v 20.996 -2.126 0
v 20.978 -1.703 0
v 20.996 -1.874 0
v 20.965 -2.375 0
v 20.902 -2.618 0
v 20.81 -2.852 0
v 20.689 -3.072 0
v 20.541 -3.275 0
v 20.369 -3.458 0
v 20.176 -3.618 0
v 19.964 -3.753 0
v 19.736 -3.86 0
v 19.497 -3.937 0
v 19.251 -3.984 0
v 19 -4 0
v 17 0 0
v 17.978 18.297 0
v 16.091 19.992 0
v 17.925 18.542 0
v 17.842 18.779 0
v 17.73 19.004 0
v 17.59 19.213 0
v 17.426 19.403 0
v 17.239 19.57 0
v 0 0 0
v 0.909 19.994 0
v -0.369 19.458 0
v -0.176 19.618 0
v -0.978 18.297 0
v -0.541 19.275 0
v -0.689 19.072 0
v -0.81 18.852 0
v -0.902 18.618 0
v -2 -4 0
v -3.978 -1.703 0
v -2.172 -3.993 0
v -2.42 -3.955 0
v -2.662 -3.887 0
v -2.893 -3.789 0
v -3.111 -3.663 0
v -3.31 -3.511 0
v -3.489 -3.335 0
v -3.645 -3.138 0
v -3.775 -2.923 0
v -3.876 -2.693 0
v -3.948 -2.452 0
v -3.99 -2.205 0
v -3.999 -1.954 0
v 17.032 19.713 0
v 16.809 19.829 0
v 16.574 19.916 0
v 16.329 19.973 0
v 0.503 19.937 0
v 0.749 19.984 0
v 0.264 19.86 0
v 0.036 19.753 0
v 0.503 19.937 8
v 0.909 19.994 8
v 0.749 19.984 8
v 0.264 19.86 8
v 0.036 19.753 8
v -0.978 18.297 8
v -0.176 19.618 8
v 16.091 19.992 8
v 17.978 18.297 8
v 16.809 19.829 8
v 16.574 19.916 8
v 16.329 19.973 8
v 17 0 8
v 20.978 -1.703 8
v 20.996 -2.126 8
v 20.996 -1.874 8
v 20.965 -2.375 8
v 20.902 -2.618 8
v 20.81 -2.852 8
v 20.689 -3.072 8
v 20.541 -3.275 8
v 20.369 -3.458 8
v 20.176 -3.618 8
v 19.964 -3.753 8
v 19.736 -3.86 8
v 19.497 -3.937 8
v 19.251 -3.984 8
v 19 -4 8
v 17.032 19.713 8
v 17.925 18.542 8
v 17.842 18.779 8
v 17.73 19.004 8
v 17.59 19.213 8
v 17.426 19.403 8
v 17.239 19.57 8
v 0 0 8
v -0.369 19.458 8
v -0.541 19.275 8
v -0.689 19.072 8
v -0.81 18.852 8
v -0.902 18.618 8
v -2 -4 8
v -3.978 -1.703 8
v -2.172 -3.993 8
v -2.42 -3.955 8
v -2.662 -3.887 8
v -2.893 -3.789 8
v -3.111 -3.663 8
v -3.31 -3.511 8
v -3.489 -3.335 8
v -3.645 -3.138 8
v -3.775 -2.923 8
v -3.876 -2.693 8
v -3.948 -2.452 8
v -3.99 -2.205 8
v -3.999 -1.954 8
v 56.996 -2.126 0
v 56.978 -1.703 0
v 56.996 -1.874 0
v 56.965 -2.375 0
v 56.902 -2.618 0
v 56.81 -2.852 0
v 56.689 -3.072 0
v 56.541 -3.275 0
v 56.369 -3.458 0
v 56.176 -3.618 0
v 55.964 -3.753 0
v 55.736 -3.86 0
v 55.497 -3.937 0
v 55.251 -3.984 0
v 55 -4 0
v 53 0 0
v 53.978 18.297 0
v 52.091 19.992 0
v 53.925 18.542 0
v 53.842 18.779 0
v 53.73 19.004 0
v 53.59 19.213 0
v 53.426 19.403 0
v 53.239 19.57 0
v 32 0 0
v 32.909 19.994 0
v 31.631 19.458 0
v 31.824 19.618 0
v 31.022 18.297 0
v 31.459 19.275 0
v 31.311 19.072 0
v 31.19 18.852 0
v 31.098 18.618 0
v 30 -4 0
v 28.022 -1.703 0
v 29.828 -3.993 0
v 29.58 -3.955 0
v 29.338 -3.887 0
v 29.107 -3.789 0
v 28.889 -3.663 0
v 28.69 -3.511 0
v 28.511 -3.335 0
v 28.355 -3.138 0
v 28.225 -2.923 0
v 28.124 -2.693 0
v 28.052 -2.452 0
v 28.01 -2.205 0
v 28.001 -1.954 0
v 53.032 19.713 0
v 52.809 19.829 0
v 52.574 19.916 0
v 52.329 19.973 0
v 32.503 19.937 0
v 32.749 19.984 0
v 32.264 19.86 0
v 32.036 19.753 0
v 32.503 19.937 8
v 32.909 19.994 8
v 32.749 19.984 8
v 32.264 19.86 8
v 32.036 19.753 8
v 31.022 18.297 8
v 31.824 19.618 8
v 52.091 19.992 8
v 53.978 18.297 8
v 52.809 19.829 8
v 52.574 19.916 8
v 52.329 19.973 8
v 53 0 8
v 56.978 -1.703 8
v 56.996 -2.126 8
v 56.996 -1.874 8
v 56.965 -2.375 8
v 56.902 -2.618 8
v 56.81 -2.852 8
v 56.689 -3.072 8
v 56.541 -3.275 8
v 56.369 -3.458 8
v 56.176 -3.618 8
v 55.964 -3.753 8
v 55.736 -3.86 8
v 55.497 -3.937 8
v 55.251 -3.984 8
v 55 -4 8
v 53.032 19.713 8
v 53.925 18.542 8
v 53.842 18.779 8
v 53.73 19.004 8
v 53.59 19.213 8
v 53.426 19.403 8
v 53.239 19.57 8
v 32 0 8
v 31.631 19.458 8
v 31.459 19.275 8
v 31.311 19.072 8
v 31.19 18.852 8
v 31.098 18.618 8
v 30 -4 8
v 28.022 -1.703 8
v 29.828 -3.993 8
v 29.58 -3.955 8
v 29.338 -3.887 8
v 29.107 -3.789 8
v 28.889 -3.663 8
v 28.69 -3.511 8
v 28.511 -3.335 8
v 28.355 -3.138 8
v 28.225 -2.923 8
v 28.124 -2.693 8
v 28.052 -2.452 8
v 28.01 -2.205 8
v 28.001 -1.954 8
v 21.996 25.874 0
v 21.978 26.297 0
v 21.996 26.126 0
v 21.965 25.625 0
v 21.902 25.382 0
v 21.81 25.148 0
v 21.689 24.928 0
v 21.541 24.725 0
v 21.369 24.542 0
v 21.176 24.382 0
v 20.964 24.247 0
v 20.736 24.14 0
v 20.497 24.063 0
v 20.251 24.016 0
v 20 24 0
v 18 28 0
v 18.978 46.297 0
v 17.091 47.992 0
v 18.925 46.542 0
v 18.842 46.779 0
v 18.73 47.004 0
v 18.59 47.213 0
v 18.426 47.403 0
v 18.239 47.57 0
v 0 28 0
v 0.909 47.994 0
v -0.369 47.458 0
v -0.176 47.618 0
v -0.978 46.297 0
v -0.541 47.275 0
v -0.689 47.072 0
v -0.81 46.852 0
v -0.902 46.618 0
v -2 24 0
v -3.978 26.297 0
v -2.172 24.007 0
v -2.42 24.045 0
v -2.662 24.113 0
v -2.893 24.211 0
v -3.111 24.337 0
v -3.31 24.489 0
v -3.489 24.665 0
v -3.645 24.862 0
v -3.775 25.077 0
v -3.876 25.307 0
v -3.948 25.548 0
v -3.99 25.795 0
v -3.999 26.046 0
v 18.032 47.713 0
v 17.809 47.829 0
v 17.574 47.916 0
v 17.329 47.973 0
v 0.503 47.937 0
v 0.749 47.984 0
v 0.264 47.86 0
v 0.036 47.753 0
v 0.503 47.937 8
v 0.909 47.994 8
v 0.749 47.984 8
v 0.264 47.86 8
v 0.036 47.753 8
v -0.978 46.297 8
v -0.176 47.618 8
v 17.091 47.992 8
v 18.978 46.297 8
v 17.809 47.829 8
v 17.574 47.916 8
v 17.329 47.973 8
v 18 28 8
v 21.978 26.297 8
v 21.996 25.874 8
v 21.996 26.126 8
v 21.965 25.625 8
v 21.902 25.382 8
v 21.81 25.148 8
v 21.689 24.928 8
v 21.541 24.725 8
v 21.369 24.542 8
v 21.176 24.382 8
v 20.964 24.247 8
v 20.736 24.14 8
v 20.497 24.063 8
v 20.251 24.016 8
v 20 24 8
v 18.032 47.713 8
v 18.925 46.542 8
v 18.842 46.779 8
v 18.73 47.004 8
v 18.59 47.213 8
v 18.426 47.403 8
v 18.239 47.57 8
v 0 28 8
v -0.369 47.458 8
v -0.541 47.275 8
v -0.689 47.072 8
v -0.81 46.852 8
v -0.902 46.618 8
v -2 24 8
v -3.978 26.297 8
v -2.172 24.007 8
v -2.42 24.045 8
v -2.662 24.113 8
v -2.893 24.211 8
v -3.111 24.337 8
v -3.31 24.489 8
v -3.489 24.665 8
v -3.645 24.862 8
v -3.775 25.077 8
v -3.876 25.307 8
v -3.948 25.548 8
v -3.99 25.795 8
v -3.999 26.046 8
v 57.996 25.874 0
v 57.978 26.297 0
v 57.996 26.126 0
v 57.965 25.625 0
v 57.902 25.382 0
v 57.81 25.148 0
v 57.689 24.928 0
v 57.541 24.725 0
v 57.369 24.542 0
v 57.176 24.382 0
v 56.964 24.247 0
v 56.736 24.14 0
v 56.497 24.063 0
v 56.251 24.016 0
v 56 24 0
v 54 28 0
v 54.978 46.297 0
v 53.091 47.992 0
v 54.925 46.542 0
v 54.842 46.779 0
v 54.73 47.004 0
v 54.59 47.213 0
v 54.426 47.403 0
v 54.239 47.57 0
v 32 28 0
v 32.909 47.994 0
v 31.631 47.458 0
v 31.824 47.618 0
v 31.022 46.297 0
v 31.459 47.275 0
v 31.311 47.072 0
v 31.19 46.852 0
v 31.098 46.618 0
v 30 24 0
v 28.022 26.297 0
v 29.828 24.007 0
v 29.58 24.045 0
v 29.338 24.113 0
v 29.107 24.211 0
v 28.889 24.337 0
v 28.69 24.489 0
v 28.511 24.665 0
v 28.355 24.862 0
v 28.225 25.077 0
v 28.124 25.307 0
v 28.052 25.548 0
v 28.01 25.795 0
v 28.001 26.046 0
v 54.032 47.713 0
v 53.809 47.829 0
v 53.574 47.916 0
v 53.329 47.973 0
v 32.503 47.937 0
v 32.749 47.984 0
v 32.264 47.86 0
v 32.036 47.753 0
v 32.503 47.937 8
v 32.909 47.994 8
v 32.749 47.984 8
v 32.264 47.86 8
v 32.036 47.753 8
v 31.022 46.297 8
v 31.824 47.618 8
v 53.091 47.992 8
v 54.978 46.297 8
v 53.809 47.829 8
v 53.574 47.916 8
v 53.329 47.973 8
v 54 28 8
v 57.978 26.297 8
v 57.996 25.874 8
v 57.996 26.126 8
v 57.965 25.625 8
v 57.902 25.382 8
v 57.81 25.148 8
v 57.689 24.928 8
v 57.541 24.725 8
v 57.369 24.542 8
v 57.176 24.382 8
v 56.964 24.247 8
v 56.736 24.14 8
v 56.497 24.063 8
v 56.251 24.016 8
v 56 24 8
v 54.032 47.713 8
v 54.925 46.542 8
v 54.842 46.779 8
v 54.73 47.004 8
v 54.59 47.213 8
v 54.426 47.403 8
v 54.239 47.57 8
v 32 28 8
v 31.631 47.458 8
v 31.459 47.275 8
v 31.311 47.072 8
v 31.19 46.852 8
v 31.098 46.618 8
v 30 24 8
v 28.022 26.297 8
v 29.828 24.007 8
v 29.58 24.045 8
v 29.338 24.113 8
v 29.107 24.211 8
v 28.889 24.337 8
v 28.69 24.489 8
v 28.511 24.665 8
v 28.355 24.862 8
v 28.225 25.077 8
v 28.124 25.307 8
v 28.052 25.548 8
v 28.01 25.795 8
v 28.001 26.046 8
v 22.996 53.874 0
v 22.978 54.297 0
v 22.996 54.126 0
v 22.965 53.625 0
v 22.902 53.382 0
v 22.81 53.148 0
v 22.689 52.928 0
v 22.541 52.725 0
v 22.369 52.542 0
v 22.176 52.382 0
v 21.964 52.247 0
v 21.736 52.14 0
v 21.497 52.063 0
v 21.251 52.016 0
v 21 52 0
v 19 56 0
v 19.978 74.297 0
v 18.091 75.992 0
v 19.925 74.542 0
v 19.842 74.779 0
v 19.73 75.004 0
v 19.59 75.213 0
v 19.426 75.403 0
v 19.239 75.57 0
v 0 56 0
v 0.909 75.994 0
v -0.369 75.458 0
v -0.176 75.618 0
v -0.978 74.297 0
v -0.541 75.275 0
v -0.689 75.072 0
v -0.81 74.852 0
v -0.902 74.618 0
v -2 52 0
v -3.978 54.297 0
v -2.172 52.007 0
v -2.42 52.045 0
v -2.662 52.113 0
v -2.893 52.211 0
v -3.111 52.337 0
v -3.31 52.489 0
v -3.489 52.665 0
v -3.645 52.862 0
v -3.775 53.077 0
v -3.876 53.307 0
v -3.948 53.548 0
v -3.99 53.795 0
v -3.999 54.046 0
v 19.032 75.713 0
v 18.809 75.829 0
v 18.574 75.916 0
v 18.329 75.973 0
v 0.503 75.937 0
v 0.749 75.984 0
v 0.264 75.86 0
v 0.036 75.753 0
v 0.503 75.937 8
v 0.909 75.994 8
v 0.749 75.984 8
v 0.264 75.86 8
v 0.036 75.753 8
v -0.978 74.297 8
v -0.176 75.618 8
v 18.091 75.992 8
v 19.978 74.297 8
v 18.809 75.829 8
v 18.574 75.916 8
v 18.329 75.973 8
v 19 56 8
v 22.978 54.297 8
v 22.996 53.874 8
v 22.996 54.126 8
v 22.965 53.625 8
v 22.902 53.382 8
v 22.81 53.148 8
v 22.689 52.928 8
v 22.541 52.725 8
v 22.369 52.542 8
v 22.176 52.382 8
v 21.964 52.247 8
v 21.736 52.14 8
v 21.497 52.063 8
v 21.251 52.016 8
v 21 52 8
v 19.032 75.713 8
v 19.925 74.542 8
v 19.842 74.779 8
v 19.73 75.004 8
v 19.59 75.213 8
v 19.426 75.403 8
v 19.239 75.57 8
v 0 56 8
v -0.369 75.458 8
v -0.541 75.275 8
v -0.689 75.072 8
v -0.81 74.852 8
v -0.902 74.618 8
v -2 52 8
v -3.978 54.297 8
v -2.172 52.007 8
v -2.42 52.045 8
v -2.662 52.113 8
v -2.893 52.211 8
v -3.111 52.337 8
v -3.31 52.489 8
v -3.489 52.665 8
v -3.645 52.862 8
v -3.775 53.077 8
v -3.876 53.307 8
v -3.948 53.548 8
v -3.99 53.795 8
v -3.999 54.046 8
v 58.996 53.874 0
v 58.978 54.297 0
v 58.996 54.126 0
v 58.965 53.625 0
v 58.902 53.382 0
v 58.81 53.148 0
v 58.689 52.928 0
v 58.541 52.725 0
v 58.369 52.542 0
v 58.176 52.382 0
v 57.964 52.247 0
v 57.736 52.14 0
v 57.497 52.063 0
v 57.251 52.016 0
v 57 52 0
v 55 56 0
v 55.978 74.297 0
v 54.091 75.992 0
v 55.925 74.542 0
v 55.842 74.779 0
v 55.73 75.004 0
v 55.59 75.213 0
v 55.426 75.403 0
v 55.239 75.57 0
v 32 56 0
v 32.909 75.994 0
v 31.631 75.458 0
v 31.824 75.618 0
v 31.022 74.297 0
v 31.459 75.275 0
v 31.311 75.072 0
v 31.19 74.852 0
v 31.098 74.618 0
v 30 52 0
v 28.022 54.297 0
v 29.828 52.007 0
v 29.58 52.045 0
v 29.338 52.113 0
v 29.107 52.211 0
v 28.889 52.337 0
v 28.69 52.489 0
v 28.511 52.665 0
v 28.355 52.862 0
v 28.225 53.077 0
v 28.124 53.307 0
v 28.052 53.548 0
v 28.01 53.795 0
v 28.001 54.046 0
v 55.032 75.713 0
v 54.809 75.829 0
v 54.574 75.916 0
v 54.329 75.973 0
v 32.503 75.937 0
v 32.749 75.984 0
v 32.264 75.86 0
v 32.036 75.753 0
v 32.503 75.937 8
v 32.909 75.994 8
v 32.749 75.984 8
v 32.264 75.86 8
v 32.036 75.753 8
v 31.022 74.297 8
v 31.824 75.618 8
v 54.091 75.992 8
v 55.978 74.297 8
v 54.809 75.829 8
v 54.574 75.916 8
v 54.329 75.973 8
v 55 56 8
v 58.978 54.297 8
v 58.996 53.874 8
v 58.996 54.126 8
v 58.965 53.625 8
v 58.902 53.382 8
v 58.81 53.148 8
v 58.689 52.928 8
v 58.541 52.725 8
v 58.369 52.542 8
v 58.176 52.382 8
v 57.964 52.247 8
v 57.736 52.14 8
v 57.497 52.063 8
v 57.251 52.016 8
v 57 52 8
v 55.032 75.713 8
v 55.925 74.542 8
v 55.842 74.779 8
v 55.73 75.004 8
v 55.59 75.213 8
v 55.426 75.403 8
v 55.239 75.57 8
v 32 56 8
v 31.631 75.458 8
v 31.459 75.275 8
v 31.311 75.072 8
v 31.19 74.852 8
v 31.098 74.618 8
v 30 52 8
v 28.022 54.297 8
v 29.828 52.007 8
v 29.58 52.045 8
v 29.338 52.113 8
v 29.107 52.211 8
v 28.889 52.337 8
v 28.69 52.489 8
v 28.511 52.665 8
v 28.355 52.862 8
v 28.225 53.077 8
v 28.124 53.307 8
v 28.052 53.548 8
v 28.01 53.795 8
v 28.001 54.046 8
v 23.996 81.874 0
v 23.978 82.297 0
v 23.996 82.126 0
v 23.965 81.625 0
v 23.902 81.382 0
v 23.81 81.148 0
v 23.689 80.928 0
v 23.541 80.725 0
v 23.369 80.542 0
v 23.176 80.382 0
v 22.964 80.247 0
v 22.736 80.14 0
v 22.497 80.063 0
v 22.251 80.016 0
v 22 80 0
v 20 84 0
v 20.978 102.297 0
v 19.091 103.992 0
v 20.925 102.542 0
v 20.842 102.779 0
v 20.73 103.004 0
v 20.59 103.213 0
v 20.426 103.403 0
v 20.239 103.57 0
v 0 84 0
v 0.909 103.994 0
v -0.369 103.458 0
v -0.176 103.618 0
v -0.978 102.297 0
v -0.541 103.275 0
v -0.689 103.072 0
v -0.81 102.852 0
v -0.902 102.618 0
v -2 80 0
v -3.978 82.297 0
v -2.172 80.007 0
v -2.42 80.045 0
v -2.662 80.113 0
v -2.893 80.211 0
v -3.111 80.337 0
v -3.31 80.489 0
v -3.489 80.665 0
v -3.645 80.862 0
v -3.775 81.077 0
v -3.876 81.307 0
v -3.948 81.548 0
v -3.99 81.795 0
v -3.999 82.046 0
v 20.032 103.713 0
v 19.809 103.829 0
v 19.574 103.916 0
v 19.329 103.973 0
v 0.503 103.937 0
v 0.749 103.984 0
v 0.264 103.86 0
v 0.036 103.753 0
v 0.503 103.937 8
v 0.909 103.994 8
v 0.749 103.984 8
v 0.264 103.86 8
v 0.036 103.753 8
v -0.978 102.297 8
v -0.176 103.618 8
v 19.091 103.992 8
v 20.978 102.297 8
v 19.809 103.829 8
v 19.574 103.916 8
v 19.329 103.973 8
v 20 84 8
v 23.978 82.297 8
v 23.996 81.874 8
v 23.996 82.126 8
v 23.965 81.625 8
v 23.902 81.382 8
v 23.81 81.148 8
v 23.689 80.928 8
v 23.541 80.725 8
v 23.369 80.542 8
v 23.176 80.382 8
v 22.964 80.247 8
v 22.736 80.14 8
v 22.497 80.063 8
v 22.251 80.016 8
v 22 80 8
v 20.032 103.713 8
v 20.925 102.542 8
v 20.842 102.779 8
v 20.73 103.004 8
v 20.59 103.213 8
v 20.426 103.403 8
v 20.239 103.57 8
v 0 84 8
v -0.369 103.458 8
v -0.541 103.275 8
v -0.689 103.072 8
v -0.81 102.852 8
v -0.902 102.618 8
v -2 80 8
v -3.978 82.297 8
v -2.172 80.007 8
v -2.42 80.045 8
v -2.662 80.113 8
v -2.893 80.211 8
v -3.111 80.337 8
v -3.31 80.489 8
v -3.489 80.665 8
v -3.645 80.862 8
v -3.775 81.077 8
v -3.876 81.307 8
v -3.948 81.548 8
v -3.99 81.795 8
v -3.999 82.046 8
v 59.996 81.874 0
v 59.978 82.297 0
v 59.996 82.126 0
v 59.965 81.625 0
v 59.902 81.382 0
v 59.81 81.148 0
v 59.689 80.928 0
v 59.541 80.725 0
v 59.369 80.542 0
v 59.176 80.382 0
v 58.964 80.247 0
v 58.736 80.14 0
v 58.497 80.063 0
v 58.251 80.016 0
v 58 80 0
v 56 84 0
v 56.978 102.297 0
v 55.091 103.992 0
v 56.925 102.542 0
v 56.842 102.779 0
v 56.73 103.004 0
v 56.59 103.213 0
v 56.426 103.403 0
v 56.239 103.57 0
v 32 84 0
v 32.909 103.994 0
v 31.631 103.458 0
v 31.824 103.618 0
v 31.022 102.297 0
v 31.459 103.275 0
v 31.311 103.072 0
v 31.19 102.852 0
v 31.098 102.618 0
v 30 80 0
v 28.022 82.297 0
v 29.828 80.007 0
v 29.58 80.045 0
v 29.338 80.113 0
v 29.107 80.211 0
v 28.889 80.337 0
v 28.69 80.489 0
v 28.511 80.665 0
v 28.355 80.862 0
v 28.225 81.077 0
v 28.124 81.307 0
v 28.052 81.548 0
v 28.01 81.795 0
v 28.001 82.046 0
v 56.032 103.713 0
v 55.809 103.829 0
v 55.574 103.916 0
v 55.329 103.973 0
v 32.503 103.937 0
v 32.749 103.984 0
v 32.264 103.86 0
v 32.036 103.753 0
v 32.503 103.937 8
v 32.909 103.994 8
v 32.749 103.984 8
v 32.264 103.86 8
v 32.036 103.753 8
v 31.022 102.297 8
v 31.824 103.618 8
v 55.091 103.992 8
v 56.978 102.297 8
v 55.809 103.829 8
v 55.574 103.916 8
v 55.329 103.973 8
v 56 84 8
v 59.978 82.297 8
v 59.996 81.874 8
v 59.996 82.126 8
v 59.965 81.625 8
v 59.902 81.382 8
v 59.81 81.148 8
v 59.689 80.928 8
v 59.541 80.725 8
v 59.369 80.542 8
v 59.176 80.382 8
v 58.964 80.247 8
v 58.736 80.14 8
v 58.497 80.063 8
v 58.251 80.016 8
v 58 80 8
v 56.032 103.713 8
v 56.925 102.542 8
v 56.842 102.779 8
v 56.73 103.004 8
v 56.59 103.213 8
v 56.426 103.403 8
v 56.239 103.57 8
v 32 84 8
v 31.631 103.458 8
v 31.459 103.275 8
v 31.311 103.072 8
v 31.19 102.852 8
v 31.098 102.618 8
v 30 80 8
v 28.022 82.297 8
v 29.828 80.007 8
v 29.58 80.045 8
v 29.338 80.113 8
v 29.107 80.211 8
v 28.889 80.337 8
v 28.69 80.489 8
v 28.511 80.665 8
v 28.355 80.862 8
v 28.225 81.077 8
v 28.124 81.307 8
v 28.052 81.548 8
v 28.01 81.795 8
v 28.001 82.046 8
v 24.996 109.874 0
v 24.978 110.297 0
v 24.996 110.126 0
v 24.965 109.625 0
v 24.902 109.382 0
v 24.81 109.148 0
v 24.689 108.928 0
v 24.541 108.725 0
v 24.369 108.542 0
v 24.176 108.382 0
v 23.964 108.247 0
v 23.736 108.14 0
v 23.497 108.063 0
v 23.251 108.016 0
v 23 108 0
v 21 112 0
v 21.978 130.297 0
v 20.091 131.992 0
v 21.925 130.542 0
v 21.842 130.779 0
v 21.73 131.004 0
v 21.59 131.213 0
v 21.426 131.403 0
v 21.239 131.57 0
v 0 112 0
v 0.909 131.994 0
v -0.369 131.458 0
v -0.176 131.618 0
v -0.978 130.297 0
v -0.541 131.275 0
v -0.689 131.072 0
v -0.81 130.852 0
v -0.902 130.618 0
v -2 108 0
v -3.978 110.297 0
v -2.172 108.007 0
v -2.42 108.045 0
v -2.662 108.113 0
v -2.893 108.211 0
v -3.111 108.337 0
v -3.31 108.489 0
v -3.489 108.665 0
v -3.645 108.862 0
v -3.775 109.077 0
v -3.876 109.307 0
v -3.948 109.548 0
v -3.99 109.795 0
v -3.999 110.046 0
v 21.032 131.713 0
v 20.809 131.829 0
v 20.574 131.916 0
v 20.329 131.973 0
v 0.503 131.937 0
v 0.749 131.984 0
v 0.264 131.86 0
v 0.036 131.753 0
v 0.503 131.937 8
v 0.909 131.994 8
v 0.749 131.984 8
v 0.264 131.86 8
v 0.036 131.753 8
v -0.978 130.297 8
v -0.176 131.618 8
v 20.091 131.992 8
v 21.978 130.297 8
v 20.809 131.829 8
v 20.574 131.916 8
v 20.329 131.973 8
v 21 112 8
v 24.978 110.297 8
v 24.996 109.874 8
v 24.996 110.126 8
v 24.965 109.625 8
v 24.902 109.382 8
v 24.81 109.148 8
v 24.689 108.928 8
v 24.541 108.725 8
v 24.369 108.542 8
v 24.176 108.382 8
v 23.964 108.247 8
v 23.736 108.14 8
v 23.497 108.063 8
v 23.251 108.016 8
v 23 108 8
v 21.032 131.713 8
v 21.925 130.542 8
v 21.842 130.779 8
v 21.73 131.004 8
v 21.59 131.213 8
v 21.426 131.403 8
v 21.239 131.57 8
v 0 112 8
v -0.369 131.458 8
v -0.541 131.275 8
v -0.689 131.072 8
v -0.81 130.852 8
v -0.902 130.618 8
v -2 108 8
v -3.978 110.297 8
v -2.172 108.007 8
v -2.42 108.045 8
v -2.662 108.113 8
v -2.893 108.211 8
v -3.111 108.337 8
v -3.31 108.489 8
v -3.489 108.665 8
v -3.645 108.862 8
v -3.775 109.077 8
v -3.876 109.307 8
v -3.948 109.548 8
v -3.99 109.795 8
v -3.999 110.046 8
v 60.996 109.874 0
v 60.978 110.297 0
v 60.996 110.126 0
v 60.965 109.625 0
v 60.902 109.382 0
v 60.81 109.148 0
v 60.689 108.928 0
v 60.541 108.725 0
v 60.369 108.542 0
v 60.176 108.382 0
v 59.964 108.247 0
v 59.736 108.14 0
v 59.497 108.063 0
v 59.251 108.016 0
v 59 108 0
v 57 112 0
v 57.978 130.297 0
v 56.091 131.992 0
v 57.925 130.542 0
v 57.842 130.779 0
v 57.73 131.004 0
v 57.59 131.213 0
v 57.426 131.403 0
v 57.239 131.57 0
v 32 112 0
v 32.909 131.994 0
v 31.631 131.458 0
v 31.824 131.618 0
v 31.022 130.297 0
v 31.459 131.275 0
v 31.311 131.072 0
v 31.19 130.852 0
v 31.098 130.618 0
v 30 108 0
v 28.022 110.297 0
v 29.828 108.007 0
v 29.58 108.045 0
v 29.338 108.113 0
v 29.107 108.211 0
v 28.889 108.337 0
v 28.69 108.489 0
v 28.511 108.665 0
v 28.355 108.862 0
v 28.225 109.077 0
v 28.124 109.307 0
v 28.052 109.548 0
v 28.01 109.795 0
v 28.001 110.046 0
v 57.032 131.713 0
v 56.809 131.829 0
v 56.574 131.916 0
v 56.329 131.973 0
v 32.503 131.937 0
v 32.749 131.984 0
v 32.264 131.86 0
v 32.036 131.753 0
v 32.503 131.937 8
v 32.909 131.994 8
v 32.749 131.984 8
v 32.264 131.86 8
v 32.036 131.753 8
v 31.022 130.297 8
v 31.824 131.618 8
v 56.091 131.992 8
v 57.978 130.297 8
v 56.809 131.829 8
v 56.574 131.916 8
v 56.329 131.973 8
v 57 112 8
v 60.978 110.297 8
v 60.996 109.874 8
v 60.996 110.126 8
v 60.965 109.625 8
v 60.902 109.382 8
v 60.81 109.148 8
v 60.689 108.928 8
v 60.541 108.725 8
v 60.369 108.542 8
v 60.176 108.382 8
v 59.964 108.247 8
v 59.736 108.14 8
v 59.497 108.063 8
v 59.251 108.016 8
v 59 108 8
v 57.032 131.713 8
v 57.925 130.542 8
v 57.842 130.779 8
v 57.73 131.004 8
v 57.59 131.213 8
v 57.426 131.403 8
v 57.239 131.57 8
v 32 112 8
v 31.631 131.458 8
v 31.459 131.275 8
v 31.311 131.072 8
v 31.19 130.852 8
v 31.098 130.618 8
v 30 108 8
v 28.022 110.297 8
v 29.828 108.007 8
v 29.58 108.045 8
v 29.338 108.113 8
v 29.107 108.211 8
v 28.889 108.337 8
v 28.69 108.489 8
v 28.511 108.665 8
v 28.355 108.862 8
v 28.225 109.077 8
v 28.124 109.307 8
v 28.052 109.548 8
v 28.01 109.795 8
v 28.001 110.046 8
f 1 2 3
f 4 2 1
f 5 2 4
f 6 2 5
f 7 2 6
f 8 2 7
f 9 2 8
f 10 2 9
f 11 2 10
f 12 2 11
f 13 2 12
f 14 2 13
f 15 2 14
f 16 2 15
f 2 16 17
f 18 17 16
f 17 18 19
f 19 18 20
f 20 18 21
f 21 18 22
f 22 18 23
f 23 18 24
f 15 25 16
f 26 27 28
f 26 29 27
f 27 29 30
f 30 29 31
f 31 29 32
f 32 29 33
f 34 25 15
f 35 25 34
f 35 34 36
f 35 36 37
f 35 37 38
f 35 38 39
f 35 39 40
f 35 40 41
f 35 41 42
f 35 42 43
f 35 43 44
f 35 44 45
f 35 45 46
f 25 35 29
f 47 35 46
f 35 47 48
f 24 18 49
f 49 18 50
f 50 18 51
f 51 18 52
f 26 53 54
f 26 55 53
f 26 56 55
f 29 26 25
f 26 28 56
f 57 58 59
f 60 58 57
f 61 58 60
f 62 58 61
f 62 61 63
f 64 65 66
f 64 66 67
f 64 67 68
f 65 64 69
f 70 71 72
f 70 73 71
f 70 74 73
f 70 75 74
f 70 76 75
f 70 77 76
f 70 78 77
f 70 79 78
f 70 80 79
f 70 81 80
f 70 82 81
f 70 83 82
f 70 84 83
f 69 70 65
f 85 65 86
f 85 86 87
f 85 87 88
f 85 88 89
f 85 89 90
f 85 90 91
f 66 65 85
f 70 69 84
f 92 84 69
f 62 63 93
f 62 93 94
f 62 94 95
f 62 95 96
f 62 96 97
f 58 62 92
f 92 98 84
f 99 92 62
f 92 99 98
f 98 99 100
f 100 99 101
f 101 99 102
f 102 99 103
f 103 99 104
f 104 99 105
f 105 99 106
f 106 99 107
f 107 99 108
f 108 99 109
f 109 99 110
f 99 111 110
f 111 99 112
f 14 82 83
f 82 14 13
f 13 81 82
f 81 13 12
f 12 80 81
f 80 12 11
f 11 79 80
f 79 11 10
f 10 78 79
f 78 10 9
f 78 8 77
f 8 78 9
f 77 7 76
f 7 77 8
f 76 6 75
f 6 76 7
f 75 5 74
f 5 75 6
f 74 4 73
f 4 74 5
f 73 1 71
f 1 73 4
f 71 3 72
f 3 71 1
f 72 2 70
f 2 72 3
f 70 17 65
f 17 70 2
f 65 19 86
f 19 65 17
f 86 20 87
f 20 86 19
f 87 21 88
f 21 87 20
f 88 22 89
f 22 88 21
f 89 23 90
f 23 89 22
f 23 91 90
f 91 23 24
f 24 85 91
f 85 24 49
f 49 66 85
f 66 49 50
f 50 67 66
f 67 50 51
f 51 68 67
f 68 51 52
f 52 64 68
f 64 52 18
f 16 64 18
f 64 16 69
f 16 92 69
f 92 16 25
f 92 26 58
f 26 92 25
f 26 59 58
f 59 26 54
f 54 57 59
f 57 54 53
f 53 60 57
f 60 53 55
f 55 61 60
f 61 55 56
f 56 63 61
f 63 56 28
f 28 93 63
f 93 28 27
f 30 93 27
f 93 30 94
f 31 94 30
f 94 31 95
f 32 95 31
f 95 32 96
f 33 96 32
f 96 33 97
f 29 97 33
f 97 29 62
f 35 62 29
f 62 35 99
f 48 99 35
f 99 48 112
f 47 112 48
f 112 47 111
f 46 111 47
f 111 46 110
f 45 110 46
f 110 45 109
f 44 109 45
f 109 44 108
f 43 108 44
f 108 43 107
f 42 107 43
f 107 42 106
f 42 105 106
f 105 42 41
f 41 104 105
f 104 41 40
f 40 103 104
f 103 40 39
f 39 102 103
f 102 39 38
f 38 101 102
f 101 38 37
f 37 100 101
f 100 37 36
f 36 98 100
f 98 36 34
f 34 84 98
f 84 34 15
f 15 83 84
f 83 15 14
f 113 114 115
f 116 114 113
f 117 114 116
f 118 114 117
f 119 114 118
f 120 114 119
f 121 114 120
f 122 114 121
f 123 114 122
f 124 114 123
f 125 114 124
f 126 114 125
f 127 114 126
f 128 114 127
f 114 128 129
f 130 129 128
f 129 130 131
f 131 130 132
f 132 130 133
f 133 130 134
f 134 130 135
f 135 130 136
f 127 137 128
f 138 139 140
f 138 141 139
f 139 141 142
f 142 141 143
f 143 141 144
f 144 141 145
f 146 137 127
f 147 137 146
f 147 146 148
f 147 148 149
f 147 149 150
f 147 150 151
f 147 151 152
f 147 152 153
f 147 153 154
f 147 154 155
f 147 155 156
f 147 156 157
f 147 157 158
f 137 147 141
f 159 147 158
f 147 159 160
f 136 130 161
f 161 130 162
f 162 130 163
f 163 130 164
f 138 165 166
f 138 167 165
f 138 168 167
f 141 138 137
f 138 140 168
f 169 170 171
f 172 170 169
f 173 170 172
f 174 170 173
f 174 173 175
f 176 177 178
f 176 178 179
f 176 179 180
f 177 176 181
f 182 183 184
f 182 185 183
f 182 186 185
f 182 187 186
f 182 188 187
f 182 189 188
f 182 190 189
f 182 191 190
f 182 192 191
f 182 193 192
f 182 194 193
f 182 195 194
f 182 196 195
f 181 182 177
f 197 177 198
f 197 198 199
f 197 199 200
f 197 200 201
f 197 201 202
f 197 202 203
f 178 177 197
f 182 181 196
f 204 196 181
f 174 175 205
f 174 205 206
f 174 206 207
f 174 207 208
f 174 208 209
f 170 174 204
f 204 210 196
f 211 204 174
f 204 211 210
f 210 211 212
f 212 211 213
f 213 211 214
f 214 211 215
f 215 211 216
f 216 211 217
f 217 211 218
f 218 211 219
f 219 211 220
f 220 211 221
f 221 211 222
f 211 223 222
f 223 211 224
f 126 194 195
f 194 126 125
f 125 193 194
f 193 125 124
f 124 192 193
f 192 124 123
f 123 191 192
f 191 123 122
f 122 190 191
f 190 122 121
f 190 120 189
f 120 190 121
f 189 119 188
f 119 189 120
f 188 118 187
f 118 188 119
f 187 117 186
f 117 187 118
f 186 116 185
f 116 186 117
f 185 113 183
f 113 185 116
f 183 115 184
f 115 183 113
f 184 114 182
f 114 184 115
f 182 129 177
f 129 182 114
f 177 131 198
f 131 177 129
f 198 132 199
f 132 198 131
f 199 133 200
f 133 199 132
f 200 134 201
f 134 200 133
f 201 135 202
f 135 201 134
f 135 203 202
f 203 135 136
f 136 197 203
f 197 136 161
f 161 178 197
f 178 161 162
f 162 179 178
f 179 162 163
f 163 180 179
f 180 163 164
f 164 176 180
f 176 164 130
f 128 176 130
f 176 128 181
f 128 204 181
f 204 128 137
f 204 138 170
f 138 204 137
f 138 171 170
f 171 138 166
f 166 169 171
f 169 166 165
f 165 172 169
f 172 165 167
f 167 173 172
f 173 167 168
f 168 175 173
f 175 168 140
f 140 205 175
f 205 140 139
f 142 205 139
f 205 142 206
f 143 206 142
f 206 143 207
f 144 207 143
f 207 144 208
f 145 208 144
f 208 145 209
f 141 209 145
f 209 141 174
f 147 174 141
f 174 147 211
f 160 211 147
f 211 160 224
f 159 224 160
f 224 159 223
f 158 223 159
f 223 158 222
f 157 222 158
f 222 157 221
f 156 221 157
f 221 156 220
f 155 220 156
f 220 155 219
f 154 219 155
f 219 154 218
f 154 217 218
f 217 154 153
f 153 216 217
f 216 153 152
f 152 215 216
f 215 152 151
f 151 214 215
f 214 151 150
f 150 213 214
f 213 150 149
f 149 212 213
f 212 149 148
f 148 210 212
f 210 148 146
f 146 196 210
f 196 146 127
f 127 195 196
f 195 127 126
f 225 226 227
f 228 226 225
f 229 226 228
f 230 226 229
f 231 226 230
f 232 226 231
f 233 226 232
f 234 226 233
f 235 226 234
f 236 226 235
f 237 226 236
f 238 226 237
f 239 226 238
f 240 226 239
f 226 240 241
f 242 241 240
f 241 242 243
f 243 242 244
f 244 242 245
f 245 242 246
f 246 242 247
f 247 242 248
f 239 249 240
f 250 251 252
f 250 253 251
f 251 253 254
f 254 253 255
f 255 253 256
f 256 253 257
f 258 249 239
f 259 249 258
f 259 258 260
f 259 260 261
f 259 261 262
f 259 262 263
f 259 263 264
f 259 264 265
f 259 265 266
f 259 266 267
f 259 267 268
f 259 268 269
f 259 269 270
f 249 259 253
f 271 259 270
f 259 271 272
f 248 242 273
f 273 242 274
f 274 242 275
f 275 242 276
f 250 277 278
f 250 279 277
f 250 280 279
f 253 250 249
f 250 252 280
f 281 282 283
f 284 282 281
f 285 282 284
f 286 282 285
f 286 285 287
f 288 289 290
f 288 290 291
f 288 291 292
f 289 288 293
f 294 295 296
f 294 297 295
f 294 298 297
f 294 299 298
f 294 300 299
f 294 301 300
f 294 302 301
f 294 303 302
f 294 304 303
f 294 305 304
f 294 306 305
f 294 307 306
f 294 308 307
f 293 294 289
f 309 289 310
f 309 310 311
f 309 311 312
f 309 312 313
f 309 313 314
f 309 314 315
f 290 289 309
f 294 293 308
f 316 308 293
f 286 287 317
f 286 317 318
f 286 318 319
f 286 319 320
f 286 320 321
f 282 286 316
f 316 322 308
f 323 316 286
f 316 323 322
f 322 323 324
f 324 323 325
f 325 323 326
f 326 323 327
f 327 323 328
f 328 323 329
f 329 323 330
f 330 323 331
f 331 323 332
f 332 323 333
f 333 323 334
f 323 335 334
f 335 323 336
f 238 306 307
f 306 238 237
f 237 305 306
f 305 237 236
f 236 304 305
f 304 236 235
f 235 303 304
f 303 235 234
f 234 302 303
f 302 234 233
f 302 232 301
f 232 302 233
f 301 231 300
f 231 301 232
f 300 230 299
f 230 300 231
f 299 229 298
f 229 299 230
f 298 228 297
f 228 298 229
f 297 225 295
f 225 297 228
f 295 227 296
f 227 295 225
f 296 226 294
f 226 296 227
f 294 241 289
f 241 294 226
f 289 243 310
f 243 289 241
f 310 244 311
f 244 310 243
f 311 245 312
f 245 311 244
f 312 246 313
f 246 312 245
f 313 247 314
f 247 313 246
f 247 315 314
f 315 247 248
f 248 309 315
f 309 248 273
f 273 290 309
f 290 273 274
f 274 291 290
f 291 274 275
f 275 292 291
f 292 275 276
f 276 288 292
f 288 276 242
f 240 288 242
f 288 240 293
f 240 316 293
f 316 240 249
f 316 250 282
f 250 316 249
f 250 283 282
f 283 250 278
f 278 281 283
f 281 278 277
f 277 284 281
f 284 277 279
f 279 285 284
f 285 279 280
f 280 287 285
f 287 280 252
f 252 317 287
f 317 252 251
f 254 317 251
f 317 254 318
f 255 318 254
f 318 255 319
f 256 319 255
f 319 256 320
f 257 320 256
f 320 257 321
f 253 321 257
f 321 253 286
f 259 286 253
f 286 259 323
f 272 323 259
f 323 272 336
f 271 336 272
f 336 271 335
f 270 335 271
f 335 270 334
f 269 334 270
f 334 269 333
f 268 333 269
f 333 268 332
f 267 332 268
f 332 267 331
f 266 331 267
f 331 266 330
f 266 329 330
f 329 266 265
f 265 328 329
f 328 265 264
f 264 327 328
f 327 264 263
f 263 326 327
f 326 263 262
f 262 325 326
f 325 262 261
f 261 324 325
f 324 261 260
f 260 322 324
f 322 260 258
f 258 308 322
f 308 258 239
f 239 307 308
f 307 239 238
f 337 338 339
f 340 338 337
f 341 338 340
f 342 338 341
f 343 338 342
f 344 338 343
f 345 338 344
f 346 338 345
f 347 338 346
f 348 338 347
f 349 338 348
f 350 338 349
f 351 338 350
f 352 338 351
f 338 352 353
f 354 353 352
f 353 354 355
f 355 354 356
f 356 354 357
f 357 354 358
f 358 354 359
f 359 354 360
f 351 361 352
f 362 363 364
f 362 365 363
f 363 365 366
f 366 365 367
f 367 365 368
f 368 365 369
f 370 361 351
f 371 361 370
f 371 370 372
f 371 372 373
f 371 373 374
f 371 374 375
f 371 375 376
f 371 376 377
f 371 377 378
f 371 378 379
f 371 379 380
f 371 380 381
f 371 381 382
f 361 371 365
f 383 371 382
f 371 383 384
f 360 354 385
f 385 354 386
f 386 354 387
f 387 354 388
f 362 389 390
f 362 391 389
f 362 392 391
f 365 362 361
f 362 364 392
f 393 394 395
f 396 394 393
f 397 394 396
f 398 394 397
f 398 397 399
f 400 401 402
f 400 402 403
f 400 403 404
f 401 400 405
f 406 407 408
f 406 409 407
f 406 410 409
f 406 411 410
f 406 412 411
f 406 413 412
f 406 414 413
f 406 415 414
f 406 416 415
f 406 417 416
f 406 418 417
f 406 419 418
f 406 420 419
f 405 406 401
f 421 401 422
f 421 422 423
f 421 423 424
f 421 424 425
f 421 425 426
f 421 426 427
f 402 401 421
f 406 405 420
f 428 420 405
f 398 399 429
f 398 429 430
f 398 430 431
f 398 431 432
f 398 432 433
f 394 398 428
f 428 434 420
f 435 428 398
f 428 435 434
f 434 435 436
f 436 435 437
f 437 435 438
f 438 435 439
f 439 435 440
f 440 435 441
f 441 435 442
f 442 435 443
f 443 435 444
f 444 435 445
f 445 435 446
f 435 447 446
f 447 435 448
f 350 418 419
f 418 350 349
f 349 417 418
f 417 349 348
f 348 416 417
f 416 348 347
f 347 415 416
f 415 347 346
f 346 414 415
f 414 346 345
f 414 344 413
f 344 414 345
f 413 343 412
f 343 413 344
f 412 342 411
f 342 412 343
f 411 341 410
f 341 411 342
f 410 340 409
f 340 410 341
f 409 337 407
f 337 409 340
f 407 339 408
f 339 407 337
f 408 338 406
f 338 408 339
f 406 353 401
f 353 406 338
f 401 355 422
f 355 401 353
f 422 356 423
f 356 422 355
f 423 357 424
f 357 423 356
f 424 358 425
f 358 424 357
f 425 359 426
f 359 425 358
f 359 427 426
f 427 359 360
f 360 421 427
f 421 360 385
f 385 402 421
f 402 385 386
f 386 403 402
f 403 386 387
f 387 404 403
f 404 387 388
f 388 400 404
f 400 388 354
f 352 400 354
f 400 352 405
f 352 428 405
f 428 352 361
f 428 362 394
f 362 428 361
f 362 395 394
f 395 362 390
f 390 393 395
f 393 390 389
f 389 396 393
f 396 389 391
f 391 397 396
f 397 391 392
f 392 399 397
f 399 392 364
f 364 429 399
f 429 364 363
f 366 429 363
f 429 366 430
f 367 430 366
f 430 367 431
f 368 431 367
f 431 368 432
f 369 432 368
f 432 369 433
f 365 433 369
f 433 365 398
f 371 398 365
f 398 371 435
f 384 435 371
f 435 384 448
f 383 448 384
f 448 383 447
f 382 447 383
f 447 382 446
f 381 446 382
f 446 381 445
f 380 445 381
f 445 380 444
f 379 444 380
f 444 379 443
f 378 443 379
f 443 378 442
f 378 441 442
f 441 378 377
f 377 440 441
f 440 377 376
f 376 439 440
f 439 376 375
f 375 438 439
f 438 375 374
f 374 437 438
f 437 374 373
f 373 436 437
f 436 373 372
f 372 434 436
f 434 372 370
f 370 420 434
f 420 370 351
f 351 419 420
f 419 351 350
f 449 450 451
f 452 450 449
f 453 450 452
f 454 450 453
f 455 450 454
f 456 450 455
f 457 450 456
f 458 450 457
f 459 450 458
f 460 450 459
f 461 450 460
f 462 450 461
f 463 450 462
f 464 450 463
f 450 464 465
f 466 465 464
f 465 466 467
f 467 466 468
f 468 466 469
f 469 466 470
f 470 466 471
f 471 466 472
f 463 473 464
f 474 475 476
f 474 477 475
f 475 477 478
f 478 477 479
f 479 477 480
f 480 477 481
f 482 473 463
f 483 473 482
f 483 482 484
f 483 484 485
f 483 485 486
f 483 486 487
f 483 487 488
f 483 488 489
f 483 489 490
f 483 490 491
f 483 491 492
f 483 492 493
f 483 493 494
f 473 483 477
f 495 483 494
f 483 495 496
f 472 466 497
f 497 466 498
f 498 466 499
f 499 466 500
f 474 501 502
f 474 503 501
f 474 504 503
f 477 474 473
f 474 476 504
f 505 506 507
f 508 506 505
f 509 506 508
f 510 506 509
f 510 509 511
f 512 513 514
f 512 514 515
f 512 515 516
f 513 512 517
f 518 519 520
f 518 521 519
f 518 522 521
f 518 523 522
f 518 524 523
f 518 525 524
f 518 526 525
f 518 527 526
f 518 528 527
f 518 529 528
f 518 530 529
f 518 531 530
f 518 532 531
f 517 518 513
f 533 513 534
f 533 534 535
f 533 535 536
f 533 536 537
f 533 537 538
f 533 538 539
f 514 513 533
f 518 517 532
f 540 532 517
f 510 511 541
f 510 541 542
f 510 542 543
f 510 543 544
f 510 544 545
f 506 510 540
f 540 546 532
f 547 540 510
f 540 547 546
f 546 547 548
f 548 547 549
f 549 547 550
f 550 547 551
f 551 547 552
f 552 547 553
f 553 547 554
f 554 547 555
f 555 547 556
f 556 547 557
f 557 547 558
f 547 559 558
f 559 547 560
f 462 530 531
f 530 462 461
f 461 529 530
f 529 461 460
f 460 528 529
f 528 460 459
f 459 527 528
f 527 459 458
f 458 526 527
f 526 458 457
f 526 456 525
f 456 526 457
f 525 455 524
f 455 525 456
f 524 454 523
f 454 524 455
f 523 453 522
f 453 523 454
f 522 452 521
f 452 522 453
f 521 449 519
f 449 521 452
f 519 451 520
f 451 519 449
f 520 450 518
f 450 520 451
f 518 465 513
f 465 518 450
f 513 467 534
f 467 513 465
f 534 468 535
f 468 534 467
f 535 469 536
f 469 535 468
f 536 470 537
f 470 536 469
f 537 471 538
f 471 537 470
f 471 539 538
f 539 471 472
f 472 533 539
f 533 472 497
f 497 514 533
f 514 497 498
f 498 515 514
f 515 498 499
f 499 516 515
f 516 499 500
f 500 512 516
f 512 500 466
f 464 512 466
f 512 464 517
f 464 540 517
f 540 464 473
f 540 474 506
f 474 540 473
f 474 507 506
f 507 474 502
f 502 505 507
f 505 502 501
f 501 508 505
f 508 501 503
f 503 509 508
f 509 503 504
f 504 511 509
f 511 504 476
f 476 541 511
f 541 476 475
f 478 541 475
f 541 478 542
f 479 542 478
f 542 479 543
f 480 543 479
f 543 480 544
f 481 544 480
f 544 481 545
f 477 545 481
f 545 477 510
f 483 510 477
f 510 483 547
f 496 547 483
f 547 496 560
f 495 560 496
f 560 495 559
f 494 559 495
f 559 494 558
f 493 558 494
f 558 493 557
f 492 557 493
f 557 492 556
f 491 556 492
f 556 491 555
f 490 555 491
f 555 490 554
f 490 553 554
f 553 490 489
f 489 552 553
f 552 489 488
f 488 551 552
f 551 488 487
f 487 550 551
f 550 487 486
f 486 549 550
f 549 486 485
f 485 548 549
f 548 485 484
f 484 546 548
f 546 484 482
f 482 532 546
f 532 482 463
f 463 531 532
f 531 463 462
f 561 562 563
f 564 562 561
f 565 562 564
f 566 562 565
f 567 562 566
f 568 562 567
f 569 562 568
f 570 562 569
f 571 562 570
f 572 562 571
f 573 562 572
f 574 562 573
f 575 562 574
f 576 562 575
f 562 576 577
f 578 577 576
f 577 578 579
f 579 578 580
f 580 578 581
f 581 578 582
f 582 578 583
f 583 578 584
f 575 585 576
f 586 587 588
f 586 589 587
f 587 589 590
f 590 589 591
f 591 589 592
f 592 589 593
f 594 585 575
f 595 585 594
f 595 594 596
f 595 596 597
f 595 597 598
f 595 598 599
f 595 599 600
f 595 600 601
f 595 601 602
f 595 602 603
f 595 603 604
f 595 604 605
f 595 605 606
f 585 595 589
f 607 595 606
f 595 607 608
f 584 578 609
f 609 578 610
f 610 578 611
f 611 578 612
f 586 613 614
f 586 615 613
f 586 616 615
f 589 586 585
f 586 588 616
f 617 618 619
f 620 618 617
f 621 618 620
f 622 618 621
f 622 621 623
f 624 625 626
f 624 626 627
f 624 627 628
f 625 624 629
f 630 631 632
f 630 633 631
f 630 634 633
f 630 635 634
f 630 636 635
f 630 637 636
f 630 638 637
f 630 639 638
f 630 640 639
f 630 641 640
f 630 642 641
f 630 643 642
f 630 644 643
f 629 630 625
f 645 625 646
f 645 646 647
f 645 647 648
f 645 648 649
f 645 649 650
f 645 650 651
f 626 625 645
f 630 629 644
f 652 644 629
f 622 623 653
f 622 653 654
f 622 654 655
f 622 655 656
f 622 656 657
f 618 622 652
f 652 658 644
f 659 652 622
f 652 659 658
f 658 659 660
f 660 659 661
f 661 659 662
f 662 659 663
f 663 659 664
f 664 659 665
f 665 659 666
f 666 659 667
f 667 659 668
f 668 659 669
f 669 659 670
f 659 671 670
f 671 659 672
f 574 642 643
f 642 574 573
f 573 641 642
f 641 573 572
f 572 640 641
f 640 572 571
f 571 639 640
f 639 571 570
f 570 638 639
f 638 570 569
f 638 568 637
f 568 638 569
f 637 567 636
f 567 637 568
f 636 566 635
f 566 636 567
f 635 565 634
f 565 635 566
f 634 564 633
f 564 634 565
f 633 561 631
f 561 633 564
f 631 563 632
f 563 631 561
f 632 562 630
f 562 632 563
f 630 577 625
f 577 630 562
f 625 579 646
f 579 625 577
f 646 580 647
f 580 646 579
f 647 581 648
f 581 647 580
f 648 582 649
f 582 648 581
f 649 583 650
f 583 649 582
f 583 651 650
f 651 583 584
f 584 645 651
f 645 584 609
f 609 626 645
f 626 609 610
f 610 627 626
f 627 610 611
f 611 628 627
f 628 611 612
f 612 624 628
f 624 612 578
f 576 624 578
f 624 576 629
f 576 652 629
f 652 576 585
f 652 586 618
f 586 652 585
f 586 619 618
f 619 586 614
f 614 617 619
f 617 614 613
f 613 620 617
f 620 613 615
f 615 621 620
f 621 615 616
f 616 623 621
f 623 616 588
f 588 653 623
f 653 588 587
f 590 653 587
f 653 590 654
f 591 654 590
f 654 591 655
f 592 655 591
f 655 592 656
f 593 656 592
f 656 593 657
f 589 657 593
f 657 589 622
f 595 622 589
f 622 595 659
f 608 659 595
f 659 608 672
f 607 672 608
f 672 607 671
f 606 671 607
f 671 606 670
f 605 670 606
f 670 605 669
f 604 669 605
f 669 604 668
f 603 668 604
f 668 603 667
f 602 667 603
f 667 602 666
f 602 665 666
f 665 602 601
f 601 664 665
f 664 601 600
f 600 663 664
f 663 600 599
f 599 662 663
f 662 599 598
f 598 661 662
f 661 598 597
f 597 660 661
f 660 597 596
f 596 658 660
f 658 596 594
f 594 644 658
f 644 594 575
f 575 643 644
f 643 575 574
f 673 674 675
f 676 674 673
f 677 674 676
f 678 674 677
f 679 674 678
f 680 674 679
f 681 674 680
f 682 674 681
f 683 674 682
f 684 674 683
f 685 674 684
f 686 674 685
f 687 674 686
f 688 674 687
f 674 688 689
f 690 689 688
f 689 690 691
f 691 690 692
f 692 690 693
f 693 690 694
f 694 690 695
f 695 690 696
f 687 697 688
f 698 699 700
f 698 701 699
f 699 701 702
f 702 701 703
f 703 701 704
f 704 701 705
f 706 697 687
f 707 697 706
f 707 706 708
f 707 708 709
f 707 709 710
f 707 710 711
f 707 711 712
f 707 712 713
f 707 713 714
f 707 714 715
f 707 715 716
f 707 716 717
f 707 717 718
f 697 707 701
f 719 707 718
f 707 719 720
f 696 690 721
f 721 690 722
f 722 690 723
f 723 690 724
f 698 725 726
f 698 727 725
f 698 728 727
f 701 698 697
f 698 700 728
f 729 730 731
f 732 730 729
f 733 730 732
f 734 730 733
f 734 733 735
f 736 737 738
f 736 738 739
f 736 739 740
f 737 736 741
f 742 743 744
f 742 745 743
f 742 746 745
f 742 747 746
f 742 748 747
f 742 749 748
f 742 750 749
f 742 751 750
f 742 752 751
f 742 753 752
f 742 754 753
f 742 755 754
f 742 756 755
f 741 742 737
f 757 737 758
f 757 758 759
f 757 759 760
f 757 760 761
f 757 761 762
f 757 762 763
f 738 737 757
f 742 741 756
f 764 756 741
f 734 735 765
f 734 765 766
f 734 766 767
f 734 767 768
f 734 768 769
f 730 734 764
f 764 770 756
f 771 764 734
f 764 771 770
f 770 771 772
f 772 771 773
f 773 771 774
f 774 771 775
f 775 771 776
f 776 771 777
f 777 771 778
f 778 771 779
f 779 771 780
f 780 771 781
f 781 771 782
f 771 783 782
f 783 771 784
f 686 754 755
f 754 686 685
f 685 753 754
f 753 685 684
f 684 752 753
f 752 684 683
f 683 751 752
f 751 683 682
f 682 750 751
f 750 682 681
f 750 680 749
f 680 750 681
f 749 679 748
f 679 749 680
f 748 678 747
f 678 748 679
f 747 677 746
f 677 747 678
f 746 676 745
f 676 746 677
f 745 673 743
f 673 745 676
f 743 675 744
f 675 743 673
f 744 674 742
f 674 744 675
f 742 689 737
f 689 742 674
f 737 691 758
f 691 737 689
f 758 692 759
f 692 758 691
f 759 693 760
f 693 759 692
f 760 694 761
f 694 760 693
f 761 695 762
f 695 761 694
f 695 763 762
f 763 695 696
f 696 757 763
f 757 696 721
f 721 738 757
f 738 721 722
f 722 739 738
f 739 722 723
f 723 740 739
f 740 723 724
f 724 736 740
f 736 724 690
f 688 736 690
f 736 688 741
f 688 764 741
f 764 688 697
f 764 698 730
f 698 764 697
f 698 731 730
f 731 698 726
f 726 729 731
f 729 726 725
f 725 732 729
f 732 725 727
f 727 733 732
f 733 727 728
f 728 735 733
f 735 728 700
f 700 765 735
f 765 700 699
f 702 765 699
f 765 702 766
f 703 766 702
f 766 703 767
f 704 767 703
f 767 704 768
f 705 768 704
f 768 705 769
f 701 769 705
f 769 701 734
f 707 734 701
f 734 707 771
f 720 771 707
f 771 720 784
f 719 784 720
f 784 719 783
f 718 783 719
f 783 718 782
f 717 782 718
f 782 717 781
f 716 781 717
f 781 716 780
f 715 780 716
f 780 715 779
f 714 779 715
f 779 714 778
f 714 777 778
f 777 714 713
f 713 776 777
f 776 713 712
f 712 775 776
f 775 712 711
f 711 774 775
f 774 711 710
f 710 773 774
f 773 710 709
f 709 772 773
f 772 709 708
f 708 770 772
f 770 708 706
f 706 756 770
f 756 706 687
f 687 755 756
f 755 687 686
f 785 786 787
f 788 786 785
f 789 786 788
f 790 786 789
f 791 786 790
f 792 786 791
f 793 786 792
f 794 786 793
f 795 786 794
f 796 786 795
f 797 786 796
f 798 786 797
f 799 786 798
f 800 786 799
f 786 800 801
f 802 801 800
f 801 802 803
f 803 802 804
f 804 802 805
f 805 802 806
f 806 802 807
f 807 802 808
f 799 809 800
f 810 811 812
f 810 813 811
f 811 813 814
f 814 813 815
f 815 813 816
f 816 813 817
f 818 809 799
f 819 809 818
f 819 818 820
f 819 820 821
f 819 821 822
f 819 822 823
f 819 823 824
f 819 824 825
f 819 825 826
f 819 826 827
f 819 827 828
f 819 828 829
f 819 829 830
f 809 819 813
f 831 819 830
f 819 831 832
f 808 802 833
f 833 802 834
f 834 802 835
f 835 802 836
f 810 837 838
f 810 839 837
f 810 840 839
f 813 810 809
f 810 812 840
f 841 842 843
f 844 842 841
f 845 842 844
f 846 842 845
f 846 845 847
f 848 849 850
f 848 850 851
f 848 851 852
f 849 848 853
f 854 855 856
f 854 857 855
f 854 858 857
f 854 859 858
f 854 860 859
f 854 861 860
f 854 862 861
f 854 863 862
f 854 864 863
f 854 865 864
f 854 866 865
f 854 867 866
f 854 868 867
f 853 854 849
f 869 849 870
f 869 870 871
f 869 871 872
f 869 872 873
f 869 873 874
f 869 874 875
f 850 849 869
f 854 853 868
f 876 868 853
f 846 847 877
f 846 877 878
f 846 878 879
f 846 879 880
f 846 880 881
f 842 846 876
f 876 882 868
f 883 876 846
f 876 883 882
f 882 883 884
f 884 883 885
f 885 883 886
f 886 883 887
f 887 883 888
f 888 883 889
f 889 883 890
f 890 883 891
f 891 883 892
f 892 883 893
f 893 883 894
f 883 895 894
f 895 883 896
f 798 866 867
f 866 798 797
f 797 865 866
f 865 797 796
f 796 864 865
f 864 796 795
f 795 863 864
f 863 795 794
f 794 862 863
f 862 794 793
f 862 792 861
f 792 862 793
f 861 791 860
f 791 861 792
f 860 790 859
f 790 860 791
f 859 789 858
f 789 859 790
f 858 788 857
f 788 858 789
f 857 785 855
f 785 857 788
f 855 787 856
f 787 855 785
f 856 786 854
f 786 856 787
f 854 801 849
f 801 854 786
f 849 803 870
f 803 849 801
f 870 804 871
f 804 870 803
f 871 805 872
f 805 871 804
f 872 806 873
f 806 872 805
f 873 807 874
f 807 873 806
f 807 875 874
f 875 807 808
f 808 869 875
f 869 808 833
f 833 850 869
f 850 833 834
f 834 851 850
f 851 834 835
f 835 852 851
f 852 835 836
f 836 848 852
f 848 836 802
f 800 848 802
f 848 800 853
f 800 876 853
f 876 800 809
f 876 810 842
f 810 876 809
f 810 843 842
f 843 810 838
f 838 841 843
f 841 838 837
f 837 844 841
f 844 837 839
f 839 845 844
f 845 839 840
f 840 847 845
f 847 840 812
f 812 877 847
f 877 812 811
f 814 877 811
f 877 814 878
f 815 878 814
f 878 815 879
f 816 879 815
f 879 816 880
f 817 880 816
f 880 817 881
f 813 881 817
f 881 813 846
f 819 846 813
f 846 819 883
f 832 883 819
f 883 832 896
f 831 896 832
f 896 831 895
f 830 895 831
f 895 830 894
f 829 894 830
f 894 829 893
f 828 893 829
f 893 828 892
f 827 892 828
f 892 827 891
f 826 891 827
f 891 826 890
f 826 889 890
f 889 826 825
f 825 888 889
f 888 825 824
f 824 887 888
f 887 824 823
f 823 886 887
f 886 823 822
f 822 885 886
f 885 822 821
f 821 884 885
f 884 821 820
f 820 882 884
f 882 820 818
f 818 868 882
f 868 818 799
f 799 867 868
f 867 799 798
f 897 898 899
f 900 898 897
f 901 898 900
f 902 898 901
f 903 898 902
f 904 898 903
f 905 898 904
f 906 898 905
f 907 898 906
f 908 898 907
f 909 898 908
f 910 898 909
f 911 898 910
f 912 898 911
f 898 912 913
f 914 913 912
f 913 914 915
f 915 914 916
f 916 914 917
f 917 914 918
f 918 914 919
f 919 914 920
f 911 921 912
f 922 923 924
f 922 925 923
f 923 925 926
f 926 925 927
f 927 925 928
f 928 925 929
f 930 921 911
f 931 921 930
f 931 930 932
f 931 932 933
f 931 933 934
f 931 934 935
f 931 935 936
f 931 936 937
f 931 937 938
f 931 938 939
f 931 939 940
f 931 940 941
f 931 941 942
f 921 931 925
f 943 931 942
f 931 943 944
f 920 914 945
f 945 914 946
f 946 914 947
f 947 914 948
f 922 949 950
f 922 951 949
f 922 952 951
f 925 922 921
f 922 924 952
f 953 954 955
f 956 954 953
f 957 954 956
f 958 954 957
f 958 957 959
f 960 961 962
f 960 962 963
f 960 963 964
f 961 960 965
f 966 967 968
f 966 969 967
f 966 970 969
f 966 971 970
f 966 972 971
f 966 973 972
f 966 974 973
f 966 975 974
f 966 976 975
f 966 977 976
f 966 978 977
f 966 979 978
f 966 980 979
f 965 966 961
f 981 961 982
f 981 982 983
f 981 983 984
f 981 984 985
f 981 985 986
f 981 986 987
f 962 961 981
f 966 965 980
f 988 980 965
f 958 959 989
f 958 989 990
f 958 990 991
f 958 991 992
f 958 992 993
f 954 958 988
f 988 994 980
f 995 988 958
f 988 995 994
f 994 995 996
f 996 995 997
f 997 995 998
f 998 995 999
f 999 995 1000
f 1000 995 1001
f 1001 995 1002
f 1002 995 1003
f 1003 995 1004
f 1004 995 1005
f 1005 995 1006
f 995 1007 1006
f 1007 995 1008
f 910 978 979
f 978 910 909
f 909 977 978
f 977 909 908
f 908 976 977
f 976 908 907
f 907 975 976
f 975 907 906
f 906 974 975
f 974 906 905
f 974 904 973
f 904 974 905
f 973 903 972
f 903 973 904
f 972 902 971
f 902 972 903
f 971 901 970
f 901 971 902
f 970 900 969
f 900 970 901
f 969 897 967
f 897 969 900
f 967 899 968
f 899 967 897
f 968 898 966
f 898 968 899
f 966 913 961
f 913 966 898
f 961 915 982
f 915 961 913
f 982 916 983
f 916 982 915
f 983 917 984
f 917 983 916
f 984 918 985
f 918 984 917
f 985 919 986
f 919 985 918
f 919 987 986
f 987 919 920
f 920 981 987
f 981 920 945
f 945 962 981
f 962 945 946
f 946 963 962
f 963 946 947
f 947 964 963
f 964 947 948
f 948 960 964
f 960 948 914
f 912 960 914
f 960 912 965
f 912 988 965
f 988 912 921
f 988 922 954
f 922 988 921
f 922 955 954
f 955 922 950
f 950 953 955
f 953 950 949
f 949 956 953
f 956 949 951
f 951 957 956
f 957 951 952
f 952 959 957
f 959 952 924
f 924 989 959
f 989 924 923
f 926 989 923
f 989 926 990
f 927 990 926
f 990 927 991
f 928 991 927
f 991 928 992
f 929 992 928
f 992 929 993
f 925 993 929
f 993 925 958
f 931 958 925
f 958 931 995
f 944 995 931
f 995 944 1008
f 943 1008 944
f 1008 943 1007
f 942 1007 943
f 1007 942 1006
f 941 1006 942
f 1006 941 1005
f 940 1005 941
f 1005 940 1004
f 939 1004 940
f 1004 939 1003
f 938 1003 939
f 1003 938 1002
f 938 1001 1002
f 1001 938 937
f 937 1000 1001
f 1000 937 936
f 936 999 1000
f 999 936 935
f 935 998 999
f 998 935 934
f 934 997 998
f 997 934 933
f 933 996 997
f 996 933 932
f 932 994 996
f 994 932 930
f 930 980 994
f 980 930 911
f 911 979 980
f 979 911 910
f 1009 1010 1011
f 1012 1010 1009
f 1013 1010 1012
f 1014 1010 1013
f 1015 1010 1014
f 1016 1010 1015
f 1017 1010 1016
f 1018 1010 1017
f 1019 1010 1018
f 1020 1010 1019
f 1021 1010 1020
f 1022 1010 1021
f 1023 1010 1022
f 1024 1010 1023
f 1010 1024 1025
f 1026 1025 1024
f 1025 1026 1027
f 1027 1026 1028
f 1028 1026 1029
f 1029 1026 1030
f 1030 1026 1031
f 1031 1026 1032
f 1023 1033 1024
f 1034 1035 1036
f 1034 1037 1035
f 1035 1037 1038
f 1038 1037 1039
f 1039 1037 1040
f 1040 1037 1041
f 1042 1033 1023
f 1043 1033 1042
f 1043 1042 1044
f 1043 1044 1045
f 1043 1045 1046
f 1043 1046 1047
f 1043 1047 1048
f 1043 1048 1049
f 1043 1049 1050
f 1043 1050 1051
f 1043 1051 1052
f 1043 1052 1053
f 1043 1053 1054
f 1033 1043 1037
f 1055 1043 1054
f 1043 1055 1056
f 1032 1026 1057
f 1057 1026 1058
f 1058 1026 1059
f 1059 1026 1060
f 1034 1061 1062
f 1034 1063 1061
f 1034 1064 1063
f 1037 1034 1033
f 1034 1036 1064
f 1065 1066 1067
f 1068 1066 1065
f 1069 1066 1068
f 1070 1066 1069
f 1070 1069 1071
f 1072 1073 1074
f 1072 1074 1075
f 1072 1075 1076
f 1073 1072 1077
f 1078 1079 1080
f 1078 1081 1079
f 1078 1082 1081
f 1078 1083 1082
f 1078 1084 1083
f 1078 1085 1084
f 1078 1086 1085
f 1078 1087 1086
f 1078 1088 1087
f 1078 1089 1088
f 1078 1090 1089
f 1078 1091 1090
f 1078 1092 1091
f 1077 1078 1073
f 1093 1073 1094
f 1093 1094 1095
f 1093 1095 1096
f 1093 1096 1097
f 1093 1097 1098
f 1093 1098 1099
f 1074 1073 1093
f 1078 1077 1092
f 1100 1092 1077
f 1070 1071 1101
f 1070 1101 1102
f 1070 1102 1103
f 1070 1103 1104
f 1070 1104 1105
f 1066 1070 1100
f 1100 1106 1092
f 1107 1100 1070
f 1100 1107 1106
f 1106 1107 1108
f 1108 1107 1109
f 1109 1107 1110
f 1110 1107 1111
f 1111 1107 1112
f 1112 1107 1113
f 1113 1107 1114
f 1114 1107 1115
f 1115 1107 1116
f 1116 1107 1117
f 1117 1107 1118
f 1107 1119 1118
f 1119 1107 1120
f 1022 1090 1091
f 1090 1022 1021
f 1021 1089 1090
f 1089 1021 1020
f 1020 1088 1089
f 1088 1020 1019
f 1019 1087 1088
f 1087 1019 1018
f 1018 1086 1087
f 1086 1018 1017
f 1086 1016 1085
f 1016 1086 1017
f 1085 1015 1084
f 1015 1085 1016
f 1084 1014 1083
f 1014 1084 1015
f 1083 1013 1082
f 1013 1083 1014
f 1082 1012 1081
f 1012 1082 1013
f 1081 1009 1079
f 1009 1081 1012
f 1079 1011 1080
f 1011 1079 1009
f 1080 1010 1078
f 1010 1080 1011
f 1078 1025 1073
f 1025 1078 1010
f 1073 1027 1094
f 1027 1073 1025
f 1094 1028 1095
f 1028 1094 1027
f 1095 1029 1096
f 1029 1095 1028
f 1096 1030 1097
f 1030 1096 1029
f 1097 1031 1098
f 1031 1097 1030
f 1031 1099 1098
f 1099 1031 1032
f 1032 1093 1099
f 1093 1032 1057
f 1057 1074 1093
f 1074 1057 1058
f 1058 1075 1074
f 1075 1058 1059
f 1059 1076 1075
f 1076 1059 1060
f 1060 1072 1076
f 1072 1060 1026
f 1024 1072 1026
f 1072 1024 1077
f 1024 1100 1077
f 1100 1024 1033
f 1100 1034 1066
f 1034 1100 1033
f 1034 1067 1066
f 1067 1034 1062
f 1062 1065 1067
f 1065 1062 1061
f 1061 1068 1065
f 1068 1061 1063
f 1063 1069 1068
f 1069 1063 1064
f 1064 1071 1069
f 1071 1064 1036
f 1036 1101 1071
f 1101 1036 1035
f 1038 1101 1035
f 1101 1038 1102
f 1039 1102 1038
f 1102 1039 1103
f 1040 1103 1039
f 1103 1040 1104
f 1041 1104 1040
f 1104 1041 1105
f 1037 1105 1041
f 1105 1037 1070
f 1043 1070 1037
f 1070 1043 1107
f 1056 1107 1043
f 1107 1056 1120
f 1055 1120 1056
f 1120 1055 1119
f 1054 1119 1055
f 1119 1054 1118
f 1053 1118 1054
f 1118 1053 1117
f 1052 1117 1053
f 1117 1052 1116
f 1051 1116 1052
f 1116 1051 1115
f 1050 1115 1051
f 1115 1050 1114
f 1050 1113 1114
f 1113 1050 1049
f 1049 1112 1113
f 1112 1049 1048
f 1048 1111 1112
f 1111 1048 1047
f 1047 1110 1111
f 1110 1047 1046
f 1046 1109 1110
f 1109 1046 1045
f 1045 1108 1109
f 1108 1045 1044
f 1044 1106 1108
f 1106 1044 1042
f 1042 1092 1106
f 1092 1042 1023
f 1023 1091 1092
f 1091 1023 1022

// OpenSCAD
$fn = 50;

module make_peg(peg_size, peg_height, peg_top, peg_bottom, peg_offset, peg_extra_width) {
    linear_extrude(peg_size) {
        difference() {
            offset(peg_offset) {
                polygon([
                    [-peg_extra_width, -peg_extra_width],
                    [peg_extra_width + peg_bottom, -peg_extra_width],
                    [peg_bottom - (peg_bottom - peg_top)/2,
                    peg_height - peg_offset],
                    [(peg_bottom - peg_top)/2,
                    peg_height - peg_offset],
                ]);
            }
            polygon([
                [0, 0],
                [peg_bottom, 0],
                [peg_bottom - (peg_bottom - peg_top)/2,
                peg_height + peg_offset],
                [(peg_bottom - peg_top)/2,
                peg_height + peg_offset],
            ]);
        }
    }
}

union() {
    size = 15;
    max_x = 4;
    for (i=[0:max_x]) {
        for (j=[0:1]) {
            translate([j*32, i*28, 0]) {
                make_peg(8, 20, i + j*max_x + size, i + j*max_x + size + 2, 2, 2);
            }
        }
    }
}
